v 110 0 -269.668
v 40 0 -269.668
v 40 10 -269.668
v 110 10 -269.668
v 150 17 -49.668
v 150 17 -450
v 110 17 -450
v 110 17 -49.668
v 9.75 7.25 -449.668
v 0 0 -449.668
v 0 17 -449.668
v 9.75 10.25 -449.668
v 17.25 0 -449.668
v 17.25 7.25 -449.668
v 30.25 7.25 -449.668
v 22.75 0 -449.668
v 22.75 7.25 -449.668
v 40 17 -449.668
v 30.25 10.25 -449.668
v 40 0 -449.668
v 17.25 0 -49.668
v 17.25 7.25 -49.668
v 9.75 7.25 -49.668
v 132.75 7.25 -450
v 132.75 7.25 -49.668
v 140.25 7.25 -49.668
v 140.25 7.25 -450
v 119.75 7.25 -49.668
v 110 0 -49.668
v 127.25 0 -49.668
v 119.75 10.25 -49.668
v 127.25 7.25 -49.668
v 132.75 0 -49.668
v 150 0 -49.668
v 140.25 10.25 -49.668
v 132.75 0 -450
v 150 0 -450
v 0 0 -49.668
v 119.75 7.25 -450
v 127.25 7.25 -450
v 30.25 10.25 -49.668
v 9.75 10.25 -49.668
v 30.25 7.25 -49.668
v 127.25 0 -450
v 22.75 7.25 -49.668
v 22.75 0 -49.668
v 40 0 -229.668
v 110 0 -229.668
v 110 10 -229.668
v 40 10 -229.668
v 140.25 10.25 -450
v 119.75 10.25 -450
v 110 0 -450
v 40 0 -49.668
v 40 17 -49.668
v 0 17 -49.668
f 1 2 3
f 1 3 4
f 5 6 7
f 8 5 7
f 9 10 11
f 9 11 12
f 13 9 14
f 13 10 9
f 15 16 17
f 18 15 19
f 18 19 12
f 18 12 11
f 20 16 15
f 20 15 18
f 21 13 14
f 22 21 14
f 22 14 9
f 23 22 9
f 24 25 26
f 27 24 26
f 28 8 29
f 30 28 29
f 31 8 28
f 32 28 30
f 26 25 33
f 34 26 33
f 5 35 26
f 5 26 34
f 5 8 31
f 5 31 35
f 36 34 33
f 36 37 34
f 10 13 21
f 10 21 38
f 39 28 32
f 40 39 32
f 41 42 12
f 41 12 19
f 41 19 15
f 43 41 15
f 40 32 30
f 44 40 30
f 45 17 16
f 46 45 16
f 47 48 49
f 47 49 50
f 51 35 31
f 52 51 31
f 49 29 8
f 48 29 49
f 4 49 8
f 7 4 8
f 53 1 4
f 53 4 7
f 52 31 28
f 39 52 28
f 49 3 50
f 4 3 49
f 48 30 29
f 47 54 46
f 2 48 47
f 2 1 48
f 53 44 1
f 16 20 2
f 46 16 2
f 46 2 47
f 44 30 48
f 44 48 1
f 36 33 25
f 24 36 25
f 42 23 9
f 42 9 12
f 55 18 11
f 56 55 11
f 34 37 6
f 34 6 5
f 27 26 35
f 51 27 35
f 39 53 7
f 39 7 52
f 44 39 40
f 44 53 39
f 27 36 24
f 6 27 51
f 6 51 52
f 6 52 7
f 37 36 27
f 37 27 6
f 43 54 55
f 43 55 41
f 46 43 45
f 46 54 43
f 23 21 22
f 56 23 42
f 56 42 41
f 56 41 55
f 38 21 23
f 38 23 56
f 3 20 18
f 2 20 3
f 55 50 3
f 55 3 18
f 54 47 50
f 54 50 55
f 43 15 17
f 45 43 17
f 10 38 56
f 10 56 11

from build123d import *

# Parameters (mm, degrees)
BOSS_EXTRUDE1_DEPTH     = 17
SKETCH2_W               = 70
SKETCH2_H               = 40
CUT_EXTRUDE1_DEPTH      = 7
CUT_EXTRUDE2_DEPTH      = 401.331856029
SKETCH4_W               = 150
SKETCH4_H               = 39.668143971
CUT_EXTRUDE3_DEPTH      = 1
CUT_EXTRUDE3_DEPTH_BACK = 18


with BuildPart() as part:
    # Sketch1 → Boss-Extrude1 (new body)
    with BuildSketch(Plane(origin=(0, 0, 0), x_dir=(1, 0, 0), z_dir=(0, 1, 0))):
        Polygon((40, 449.668143971), (40, 269.668143971), (110, 269.668143971), (110, 450), (150, 450), (150, 10), (110, 10), (110, 229.668143971), (40, 229.668143971), (40, 49.668143971), (0, 49.668143971), (0, 449.668143971), align=None)
    extrude(amount=BOSS_EXTRUDE1_DEPTH)

    # Sketch2 → Cut-Extrude1 (cut)
    with BuildSketch(Plane(origin=(0, 17, 0), x_dir=(1, 0, 0), z_dir=(0, 1, 0))):
        with Locations((75, 249.668143971)):
            Rectangle(SKETCH2_W, SKETCH2_H)
    extrude(amount=-CUT_EXTRUDE1_DEPTH, mode=Mode.SUBTRACT)

    # Sketch3 → Cut-Extrude2 (cut, through all)
    with BuildSketch(Plane.XY.offset(-49.668143971)):
        Polygon((17.25, 0), (17.25, 7.25), (9.75, 7.25), (9.75, 10.25), (30.25, 10.25), (30.25, 7.25), (22.75, 7.25), (22.75, 0), align=None)
    cut_extrude2 = extrude(amount=-CUT_EXTRUDE2_DEPTH, mode=Mode.SUBTRACT)

    # Mirror1: Cut-Extrude2 across plane
    add(cut_extrude2.mirror(Plane(origin=(75, 0, 0), x_dir=(0, 0, 1), z_dir=(1, 0, 0))), mode=Mode.SUBTRACT)

    # Sketch4 → Cut-Extrude3 (cut, two sides)
    with BuildSketch(Plane(origin=(0, 17, 0), x_dir=(1, 0, 0), z_dir=(0, 1, 0))) as cut_extrude3_sk:
        with Locations((75, 29.834071986)):
            Rectangle(SKETCH4_W, SKETCH4_H)
    extrude(amount=CUT_EXTRUDE3_DEPTH, mode=Mode.SUBTRACT)
    extrude(cut_extrude3_sk.sketch, amount=-CUT_EXTRUDE3_DEPTH_BACK, mode=Mode.SUBTRACT)


solid = part.part
